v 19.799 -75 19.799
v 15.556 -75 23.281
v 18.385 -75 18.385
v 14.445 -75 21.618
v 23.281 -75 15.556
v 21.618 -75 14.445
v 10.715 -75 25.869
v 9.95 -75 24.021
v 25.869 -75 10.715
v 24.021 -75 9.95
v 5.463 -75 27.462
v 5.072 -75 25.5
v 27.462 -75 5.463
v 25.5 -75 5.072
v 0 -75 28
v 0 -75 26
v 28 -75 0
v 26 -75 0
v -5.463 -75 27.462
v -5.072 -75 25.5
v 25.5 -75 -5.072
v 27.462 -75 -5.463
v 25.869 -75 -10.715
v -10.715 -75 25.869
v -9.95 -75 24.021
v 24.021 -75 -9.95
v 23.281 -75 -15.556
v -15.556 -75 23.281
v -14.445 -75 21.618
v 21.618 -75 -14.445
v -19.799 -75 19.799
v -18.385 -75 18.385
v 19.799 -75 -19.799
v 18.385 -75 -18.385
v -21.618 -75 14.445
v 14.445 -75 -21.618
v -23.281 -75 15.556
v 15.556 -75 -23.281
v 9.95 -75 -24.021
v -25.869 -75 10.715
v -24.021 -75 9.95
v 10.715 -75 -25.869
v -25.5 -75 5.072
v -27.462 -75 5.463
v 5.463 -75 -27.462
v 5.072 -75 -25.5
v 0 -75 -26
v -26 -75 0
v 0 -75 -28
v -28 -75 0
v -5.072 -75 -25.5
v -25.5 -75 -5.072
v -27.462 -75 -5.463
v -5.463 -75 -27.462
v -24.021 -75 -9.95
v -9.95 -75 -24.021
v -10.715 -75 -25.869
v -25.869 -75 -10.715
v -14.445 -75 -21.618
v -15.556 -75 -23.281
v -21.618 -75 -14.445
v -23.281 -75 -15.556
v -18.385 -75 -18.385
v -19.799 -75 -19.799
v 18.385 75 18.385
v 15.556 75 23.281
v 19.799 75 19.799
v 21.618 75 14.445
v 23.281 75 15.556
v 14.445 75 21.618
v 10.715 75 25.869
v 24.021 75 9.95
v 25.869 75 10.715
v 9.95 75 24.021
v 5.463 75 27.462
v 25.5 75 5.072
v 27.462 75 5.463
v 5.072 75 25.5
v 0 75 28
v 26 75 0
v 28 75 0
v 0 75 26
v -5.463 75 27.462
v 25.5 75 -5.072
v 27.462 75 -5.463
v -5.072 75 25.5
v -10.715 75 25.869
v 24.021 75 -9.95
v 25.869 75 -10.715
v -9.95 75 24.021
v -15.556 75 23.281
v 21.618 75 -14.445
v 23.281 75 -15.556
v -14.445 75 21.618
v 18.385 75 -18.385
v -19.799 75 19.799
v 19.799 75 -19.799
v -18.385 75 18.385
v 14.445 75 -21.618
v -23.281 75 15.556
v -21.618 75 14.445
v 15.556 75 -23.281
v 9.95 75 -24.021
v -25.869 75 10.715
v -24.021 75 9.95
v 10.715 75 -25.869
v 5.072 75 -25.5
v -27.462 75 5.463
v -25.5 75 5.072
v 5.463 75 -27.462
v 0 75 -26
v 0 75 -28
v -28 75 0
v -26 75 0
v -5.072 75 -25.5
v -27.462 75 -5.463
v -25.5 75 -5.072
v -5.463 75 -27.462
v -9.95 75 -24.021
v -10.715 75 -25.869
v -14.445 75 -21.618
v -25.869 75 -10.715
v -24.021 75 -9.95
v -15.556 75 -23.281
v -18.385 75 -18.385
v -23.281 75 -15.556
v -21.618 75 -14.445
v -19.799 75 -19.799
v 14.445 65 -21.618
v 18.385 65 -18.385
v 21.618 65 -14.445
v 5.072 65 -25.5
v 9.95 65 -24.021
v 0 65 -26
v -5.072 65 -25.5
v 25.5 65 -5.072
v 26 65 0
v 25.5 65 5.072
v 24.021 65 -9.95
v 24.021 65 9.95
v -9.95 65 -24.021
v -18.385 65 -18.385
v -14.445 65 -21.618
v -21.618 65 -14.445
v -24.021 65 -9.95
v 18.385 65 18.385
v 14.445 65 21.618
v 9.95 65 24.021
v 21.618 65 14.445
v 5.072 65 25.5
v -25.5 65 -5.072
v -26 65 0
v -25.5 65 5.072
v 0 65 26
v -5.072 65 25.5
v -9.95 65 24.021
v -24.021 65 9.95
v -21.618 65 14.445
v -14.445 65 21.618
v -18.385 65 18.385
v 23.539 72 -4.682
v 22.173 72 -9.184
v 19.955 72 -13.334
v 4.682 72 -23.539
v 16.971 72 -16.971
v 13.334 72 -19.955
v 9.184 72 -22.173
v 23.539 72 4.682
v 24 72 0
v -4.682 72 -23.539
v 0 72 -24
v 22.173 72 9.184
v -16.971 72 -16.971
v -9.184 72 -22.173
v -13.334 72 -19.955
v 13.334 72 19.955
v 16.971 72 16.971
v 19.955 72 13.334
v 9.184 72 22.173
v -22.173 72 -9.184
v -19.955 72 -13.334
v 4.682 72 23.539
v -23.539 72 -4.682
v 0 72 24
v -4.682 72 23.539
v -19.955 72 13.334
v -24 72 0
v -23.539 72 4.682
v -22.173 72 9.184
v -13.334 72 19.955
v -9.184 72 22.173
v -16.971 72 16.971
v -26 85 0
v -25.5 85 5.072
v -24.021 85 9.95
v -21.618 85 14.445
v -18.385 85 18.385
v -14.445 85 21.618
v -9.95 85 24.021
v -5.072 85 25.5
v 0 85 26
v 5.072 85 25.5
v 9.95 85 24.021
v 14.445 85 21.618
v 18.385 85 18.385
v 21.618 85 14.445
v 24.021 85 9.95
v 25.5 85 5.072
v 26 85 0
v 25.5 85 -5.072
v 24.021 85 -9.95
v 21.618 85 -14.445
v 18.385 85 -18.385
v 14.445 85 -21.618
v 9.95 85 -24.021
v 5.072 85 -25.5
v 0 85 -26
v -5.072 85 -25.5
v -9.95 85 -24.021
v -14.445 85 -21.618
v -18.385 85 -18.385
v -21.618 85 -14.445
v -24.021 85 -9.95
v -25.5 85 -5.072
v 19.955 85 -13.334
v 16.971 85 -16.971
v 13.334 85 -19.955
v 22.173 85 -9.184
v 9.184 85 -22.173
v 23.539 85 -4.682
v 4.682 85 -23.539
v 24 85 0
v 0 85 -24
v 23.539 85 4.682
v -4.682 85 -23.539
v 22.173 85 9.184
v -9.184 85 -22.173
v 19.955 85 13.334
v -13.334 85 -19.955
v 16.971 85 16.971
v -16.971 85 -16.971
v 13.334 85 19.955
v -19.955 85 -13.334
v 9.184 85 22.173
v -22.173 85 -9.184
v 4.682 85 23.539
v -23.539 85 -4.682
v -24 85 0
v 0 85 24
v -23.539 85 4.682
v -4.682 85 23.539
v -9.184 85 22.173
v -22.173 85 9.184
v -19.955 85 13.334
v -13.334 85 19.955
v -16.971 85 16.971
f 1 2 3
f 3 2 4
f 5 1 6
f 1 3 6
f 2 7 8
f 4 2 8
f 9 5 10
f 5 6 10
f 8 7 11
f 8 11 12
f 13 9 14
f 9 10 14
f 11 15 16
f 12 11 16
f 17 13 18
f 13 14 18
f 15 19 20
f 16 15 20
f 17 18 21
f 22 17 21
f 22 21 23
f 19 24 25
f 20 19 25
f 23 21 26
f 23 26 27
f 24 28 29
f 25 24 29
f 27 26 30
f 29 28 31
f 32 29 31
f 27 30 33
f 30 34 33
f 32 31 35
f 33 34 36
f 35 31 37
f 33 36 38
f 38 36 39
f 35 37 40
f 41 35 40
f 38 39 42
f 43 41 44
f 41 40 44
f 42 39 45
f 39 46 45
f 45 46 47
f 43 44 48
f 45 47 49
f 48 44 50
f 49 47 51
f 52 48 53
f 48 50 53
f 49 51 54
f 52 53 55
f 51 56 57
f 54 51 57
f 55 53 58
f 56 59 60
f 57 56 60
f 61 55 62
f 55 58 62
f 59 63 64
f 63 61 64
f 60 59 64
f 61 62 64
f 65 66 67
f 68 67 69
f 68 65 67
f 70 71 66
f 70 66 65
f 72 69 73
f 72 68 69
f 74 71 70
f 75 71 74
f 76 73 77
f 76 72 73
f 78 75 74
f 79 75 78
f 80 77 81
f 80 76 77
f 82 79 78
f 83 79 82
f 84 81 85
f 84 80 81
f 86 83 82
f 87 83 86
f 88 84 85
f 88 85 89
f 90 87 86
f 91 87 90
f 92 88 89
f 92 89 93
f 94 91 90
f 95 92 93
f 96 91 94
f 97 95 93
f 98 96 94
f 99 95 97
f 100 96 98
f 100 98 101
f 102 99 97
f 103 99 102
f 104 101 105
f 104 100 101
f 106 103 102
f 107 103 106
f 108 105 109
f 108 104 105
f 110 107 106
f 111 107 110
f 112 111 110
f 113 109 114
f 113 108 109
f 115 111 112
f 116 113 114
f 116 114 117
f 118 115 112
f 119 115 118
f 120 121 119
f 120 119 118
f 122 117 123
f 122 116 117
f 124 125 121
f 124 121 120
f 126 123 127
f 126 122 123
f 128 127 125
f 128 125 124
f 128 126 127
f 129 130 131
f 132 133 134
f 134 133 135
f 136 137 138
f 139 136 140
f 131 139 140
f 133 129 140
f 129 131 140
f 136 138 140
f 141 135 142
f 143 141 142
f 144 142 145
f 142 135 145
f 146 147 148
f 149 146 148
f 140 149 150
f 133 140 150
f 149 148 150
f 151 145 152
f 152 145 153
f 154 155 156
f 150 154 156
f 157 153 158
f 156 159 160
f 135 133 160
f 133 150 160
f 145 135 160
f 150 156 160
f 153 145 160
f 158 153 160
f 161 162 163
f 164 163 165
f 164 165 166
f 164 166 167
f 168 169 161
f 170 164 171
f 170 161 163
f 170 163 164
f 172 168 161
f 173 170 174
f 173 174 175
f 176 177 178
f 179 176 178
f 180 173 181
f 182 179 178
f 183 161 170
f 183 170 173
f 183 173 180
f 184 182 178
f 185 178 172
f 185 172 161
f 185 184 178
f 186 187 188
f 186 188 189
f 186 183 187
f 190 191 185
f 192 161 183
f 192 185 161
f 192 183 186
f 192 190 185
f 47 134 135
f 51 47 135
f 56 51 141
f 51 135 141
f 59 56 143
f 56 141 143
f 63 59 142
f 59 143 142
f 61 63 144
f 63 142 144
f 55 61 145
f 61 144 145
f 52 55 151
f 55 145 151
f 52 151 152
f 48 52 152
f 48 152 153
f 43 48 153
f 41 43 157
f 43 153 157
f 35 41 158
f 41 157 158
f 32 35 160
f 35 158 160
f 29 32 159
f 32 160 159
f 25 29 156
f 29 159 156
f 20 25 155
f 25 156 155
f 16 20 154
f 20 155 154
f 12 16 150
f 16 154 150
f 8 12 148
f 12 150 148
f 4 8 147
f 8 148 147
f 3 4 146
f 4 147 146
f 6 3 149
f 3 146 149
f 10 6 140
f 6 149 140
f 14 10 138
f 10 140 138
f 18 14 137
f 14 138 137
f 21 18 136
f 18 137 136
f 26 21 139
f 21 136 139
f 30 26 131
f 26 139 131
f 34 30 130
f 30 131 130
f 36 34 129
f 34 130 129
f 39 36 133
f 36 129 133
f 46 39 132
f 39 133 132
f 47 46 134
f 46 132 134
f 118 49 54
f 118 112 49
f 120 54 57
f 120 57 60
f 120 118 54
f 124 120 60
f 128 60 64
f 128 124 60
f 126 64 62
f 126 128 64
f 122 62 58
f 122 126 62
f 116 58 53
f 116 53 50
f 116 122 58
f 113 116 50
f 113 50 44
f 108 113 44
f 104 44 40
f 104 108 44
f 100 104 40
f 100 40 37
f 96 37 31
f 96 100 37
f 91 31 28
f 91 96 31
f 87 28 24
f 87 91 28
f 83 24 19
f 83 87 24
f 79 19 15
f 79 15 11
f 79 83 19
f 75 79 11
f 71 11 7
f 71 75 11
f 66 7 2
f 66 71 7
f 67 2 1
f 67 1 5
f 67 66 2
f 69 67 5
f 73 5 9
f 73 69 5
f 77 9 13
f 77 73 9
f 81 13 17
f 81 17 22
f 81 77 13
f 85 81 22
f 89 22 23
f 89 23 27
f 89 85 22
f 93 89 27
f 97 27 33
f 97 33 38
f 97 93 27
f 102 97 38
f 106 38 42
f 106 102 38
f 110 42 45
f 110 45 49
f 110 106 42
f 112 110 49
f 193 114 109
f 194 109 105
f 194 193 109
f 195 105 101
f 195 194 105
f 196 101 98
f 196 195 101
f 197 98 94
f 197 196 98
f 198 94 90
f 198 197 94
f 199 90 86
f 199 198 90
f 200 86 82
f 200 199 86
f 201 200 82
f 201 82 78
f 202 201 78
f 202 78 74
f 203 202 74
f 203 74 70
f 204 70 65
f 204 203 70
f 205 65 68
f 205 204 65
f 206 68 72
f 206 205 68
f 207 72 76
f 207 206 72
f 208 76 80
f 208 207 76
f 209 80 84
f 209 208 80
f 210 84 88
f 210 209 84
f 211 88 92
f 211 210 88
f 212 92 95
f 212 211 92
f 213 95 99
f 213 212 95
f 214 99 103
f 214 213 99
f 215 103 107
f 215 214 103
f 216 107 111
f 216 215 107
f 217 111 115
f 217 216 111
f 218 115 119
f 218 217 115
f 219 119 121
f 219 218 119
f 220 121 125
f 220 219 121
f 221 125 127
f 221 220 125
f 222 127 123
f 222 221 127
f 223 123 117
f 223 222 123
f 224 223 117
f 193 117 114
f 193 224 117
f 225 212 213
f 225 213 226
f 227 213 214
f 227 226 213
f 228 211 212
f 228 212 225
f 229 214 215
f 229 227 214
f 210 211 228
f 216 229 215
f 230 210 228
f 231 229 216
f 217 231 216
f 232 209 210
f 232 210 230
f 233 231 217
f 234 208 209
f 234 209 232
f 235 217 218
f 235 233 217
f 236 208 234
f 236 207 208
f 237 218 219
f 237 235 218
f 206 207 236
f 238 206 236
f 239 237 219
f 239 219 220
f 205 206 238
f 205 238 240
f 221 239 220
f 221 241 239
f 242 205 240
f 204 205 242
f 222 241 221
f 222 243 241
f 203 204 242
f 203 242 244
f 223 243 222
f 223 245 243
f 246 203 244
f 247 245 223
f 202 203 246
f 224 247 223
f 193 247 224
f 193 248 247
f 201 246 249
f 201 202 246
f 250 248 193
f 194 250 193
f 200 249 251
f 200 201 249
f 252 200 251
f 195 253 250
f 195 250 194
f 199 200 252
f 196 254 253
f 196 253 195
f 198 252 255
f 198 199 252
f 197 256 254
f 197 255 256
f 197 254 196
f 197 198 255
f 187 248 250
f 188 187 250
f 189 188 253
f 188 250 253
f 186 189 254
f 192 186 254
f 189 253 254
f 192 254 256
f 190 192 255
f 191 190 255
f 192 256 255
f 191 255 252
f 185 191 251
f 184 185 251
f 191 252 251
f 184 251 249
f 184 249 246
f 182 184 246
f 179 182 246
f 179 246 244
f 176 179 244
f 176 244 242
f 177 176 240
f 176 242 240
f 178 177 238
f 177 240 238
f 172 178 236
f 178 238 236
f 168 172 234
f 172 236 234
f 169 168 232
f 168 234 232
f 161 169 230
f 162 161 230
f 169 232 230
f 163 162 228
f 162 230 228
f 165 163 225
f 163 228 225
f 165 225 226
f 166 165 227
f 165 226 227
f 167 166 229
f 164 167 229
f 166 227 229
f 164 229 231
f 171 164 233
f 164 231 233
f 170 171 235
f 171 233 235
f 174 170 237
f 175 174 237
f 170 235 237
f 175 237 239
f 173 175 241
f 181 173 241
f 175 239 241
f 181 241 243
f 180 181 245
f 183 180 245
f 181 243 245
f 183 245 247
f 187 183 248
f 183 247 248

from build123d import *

# Parameters (mm, degrees)
F0_W     = 150
F0_H     = 2
F2_R     = 26
F3_DEPTH = 10
F4_R     = 24
F5_DEPTH = 13


with BuildPart() as f1:
    # F0 (on Right) → F1 (revolve)
    with BuildSketch(Plane.YZ):
        with Locations((0, -27)):
            Rectangle(F0_W, F0_H)
    revolve(axis=Axis((0, 25.8125, 0), (0, 1, 0)))

    # F2 (on face) → F3 (join, symmetric)
    with BuildSketch(Plane(origin=(0, 75, 0), x_dir=(-1, 0, 0), z_dir=(0, 1, 0))):
        Circle(F2_R)
    extrude(amount=F3_DEPTH, both=True)

    # F4 (on face) → F5 (cut)
    with BuildSketch(Plane(origin=(0, 85, 0), x_dir=(-1, 0, 0), z_dir=(0, 1, 0))):
        Circle(F4_R)
    extrude(amount=-F5_DEPTH, mode=Mode.SUBTRACT)


solid = f1.part
